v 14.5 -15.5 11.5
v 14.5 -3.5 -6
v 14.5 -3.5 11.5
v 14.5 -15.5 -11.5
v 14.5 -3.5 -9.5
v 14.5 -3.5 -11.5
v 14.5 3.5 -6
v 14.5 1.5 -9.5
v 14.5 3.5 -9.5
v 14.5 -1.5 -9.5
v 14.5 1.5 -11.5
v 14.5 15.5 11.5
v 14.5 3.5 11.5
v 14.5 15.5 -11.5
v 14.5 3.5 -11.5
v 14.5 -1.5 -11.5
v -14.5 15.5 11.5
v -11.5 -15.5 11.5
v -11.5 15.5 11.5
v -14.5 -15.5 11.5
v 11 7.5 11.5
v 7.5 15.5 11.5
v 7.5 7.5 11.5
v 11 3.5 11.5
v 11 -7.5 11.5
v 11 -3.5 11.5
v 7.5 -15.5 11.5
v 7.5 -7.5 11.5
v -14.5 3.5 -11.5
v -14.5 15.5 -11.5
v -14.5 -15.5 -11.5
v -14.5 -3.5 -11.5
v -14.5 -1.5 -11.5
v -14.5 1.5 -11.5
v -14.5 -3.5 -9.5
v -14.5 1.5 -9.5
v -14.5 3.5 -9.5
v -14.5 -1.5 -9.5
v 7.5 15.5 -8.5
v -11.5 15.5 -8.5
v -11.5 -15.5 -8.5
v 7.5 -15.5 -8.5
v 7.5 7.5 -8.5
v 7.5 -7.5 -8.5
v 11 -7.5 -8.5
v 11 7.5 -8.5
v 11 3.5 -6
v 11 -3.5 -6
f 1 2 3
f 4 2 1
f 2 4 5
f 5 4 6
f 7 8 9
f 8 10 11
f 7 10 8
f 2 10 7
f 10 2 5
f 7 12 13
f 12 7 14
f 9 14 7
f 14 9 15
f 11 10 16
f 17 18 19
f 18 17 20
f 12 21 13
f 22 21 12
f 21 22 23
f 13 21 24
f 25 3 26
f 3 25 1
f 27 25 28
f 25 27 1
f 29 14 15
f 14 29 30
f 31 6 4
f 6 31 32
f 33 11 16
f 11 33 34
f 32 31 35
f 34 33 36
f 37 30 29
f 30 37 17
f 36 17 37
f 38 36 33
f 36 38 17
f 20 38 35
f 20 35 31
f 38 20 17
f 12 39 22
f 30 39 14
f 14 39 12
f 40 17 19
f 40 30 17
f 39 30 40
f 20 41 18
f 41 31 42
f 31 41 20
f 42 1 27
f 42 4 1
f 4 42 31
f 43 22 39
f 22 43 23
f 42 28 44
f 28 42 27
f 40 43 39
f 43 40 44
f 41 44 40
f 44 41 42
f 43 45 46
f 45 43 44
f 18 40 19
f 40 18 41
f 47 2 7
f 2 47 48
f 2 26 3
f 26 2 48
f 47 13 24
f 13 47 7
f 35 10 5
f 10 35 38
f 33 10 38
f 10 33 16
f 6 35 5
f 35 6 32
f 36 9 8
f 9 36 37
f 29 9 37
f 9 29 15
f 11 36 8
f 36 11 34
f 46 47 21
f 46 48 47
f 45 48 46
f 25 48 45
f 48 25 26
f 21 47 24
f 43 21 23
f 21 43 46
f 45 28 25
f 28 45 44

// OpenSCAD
difference () {
	translate ([0,0,0]) cube([29,31,23], center=true);
	translate ([-2,0,3]) cube([19,34,23], center=true);
	translate ([11,-2.5,4]) cube([16,2,20],center=true);
	translate ([11,2.5,4]) cube([16,2,20],center=true);
	translate ([1,-2.5,-14.5]) cube([40,2,10],center=true);
	translate ([1,2.5,-14.5]) cube([40,2,10],center=true);
	translate ([6,0,3]) cube ([10,15,23],center=true);
	translate ([13,0,5.5]) cube ([11,5,23],center=true);
}
